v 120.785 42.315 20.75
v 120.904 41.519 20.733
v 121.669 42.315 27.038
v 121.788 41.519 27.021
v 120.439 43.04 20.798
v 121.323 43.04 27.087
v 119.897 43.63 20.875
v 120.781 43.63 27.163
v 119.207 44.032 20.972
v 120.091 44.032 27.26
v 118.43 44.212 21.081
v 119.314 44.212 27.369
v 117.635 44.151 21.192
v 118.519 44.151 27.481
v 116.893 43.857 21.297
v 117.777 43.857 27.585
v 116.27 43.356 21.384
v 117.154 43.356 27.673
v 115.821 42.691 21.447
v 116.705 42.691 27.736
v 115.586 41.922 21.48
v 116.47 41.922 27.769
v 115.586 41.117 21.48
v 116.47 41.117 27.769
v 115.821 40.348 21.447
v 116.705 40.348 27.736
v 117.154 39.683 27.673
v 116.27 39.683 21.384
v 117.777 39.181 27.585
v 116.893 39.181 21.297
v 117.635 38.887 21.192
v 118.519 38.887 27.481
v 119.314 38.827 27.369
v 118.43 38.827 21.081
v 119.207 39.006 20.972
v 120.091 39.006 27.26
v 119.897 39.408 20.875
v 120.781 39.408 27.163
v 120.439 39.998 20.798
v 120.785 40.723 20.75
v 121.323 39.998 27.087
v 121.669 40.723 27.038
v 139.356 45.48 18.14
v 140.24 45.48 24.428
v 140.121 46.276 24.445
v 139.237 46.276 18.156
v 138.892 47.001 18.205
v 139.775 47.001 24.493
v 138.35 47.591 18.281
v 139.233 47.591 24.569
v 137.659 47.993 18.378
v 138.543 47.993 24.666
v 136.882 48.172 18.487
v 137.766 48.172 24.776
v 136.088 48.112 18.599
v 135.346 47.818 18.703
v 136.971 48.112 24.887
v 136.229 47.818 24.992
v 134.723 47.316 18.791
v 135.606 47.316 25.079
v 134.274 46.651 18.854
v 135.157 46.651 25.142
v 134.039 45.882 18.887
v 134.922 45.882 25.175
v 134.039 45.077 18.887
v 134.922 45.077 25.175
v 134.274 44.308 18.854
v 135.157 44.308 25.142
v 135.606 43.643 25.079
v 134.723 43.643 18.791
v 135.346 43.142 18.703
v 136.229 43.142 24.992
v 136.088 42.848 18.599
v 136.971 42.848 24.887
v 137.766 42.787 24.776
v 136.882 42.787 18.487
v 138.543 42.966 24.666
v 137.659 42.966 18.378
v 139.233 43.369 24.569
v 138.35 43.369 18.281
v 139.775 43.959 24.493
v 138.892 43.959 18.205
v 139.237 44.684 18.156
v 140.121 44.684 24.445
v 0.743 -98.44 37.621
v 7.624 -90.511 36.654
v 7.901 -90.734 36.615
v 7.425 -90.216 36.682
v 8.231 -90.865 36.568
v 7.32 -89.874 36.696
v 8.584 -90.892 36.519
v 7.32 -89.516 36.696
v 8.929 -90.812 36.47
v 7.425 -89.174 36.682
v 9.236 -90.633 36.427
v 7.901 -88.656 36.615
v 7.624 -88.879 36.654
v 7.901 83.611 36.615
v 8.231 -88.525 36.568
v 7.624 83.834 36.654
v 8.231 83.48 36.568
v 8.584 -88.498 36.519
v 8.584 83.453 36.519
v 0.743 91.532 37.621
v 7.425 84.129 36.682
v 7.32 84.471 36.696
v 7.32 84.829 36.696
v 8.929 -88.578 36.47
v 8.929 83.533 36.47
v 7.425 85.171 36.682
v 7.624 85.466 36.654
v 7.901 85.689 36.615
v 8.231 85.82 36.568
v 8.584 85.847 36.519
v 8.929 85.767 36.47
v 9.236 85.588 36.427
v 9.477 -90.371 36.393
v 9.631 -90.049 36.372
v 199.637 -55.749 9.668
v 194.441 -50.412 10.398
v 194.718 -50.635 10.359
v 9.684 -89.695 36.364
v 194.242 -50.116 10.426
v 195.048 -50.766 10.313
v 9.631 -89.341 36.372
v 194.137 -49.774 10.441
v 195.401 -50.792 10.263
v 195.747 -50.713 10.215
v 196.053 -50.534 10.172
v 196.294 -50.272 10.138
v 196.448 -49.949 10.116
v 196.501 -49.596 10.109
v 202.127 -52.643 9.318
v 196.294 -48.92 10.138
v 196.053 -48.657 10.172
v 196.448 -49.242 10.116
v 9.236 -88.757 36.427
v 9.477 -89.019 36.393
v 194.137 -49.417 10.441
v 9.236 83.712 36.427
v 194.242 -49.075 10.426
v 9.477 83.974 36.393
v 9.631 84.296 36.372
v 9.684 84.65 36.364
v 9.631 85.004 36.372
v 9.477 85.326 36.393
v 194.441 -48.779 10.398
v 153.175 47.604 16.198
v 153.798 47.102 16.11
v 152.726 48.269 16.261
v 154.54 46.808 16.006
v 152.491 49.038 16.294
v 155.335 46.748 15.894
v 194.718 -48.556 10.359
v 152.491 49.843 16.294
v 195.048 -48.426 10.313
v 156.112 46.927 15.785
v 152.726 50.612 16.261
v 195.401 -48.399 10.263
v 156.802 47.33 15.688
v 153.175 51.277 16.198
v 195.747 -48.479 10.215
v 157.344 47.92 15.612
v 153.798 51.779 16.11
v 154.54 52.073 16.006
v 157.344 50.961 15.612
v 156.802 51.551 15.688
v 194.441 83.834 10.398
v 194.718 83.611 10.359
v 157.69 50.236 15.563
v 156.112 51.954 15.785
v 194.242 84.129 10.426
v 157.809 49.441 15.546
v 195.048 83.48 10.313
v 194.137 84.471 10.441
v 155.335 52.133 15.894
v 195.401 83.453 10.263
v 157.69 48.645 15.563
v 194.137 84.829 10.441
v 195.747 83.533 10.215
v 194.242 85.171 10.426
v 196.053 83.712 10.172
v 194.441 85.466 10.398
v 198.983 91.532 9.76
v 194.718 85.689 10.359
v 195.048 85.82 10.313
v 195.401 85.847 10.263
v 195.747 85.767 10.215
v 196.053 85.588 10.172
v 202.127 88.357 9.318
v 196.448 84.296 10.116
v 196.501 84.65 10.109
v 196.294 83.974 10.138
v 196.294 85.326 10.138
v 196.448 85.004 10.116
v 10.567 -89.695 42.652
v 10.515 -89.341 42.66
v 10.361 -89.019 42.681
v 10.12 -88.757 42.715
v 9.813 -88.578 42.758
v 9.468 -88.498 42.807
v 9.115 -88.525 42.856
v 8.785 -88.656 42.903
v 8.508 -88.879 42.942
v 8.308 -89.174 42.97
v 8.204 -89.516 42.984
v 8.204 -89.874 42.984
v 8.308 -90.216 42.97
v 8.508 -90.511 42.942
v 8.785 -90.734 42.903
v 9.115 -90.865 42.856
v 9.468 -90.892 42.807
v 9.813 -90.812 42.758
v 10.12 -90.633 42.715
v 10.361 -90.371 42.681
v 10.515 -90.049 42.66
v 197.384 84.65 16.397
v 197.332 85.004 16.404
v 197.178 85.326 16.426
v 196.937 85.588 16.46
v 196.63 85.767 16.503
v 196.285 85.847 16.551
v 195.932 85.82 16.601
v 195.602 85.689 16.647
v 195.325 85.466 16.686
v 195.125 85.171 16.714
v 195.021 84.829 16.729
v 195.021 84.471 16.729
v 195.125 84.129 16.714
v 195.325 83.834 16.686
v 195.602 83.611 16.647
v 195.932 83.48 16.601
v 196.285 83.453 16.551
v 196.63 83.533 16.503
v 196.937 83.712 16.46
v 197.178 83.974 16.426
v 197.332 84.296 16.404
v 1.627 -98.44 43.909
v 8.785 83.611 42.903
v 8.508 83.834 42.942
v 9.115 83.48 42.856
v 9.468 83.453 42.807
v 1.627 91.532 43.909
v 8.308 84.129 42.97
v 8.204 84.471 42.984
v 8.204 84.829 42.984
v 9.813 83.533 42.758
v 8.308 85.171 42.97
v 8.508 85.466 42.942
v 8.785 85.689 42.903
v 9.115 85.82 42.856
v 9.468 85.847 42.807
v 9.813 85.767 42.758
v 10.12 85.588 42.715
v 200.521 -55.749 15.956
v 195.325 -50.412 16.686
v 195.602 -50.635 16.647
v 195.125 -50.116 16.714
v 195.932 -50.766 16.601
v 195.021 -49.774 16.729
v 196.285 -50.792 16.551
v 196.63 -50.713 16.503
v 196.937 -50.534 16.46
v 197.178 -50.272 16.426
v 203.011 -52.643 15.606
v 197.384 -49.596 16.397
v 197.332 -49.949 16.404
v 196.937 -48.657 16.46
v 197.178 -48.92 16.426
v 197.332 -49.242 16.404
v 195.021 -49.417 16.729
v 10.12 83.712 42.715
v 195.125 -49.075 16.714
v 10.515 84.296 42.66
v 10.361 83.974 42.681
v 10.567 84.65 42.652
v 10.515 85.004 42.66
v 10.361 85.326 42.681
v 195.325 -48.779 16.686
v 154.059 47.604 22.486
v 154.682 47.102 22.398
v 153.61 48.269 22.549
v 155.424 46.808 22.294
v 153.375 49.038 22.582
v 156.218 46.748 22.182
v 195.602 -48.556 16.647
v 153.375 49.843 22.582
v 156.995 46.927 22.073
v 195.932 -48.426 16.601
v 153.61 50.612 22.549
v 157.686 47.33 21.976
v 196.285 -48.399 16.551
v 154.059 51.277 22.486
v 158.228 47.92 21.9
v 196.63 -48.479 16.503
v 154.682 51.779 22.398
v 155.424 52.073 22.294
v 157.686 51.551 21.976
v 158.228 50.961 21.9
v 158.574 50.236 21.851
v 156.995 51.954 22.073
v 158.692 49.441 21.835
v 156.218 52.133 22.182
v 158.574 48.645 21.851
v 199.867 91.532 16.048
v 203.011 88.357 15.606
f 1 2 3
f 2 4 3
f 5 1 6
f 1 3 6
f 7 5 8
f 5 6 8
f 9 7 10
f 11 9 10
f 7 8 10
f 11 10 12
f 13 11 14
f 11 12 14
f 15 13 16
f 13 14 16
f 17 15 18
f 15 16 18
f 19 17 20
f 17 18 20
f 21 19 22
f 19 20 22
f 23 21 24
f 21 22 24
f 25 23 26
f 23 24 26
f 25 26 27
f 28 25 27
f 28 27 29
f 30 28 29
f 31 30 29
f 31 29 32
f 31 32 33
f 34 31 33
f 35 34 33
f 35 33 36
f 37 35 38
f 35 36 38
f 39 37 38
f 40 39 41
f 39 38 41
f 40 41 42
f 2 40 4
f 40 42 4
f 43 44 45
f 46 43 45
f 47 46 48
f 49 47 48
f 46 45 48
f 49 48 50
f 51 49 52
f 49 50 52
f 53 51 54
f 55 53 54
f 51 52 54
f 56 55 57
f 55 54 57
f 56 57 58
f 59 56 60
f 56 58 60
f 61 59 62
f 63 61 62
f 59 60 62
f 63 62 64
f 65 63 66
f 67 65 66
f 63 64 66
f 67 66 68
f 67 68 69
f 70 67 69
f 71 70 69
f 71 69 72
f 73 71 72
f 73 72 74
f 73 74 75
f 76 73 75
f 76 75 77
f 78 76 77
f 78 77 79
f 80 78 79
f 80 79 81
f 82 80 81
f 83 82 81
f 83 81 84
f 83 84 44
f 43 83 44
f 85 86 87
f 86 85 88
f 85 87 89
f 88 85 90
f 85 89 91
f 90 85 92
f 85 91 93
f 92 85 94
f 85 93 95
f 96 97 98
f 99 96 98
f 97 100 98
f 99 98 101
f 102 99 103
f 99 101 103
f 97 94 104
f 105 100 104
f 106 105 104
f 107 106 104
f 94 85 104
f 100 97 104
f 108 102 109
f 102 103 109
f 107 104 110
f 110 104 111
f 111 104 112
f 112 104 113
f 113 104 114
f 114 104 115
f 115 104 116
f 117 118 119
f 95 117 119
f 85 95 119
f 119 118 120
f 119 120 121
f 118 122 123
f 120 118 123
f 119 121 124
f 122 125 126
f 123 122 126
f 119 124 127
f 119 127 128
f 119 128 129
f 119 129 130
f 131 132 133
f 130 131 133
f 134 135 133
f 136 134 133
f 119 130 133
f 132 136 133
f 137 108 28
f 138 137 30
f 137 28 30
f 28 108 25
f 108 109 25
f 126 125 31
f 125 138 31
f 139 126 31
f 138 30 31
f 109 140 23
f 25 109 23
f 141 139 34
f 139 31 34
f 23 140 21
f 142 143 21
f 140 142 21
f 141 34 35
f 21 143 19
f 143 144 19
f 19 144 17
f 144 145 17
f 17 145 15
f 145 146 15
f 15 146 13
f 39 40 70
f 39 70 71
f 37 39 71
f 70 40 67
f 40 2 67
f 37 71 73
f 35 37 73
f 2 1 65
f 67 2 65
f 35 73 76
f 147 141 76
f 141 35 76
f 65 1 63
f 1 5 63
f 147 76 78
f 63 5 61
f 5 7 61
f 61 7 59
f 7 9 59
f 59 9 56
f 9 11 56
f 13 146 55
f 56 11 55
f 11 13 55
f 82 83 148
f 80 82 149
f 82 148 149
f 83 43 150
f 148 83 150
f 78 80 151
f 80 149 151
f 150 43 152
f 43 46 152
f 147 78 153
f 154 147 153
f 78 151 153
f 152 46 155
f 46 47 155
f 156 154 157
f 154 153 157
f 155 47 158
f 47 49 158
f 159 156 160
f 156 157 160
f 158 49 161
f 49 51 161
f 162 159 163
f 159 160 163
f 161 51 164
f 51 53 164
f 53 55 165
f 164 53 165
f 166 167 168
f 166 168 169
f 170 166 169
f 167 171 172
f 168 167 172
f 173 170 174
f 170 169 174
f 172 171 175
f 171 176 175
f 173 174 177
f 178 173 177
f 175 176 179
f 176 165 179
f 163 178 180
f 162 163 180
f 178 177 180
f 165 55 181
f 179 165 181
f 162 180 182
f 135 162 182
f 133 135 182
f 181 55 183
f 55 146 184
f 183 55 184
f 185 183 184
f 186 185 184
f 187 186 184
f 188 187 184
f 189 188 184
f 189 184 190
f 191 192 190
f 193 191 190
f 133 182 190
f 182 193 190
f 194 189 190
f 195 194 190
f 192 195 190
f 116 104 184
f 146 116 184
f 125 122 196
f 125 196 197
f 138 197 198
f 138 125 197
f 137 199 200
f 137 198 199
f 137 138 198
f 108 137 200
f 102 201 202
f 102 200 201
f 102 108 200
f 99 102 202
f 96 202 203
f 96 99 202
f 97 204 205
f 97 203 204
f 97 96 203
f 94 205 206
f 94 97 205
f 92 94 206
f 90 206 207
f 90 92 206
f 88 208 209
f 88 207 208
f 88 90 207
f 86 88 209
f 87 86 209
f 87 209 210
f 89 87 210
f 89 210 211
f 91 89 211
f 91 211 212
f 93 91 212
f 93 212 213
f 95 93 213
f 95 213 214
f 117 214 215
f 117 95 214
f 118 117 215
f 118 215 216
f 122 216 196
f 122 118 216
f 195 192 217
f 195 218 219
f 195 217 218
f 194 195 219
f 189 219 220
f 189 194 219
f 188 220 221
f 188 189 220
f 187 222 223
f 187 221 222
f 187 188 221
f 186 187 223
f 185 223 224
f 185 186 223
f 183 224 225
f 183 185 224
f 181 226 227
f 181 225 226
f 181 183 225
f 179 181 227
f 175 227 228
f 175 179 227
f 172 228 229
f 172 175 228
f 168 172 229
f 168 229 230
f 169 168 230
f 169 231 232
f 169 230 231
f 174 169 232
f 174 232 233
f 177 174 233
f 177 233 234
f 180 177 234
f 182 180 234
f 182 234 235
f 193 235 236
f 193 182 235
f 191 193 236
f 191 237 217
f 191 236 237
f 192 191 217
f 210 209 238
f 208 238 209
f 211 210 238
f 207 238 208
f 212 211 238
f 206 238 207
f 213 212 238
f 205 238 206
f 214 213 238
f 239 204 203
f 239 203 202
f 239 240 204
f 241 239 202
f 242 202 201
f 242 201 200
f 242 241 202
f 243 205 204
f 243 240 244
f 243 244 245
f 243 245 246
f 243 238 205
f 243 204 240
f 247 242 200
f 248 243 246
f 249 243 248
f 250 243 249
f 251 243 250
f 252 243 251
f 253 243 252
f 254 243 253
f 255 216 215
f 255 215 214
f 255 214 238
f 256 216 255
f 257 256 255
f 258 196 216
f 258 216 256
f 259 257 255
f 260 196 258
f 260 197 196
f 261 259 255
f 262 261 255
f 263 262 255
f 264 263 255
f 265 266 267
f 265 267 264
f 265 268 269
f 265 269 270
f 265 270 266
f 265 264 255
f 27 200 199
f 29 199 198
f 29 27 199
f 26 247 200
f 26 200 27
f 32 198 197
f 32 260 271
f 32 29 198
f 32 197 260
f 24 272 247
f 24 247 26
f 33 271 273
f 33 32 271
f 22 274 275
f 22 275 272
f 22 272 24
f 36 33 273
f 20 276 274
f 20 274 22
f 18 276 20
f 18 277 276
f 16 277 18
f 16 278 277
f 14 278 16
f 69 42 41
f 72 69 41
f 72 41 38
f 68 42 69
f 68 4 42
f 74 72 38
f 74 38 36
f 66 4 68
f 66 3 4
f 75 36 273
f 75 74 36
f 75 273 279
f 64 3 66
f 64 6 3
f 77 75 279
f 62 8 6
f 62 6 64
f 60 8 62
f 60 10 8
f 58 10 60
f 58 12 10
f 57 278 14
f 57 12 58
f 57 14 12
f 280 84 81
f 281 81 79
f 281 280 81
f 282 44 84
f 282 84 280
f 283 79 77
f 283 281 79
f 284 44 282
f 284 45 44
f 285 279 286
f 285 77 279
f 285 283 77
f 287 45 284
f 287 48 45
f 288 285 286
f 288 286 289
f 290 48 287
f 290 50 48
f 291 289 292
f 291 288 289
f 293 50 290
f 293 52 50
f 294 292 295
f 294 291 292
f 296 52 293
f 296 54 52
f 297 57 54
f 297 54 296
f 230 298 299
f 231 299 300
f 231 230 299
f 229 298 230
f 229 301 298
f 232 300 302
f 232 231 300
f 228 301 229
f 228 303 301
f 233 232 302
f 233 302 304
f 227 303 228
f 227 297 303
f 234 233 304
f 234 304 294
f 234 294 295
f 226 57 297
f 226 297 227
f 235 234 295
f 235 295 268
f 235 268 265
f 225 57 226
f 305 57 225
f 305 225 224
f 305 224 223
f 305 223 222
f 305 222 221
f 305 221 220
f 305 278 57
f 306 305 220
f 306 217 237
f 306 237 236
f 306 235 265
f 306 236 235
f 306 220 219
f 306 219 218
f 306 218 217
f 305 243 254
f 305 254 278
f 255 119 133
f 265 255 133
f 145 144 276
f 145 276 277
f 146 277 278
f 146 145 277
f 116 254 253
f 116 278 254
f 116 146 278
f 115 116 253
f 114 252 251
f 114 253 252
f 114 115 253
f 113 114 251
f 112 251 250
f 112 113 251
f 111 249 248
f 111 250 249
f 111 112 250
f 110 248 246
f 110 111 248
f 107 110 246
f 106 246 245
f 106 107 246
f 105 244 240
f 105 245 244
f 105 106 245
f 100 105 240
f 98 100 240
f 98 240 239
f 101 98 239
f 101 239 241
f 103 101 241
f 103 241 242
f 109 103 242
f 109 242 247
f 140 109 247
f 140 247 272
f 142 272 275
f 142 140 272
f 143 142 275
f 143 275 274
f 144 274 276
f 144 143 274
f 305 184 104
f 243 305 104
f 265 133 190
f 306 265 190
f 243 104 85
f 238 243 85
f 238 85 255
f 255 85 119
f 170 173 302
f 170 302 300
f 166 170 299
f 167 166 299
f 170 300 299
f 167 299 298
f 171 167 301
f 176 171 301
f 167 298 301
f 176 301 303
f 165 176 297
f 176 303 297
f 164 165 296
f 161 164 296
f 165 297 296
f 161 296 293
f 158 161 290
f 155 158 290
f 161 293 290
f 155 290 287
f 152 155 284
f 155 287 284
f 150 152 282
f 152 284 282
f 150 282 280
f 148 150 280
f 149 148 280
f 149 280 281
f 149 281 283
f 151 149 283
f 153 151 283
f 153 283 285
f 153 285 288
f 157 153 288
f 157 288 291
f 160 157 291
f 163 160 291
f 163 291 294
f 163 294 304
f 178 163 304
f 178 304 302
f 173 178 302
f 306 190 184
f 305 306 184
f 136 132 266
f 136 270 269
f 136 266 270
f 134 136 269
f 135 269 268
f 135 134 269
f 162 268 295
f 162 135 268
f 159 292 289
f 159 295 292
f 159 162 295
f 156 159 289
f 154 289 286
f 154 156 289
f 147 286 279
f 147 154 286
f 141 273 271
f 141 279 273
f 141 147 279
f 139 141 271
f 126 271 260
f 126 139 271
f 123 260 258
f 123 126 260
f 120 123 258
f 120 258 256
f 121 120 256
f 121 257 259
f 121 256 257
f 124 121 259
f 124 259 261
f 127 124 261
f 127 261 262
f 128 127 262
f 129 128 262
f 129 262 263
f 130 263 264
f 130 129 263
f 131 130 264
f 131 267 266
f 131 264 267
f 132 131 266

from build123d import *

# Parameters (mm, degrees)
SKETCH022_AS_DRAWN_R                      = 2.7
EXTRUDE013_DEPTH                          = 25.4
EXTRUDE013_ONTO_SKETCH022_PLACEMENT_ANGLE = 8
SKETCH018_AS_DRAWN_R                      = 1.2
EXTRUDE009_DEPTH                          = 7.8
EXTRUDE009_ONTO_SKETCH018_PLACEMENT_ANGLE = 8
EXTRUDE012_DEPTH                          = 6.35
EXTRUDE012_ONTO_SKETCH021_PLACEMENT_ANGLE = 8


with BuildPart() as top_led_holes:
    # Sketch022 as drawn → Extrude013 (new, symmetric)
    with BuildSketch(Plane.XY):
        with Locations((116.082414, 49.440535)):
            Circle(SKETCH022_AS_DRAWN_R)
        with Locations((97.448702, 45.479818)):
            Circle(SKETCH022_AS_DRAWN_R)
        with Locations((78.81499, 41.5191)):
            Circle(SKETCH022_AS_DRAWN_R)
    extrude(amount=EXTRUDE013_DEPTH, both=True)


with BuildPart() as top_led_holes_1:
    # Extrude013 onto Sketch022 placement: moved
    add(top_led_holes.part.moved(Location((42.3672, 0, 47.625))).rotate(Axis((42.3672, 0, 47.625), (0, 1, 0)), EXTRUDE013_ONTO_SKETCH022_PLACEMENT_ANGLE))


with BuildPart() as screw_hole_cuts:
    # Sketch018 as drawn → Extrude009 (new)
    with BuildSketch(Plane.XY):
        with Locations((-31.998318, 84.649891)):
            Circle(SKETCH018_AS_DRAWN_R)
        with Locations((-31.998318, -89.695043)):
            Circle(SKETCH018_AS_DRAWN_R)
        with Locations((156.654735, -49.595599)):
            Circle(SKETCH018_AS_DRAWN_R)
        with Locations((156.654735, 84.649891)):
            Circle(SKETCH018_AS_DRAWN_R)
    extrude(amount=EXTRUDE009_DEPTH)


with BuildPart() as screw_hole_cuts_1:
    # Extrude009 onto Sketch018 placement: moved
    add(screw_hole_cuts.part.moved(Location((39.98734, 0, 30.691416))).rotate(Axis((39.98734, 0, 30.691416), (0, 1, 0)), EXTRUDE009_ONTO_SKETCH018_PLACEMENT_ANGLE))


with BuildPart() as cut006:
    # Sketch021 as drawn → Extrude012 (new)
    with BuildSketch(Plane.XY):
        Polygon((-39.826537, 91.531891), (-39.826537, -98.44048), (161.021837, -55.74884), (163.536735, -52.643218), (163.536735, 88.356895), (160.361736, 91.531891), align=None)
    extrude(amount=EXTRUDE012_DEPTH)


with BuildPart() as cut006_1:
    # Extrude012 onto Sketch021 placement: moved
    add(cut006.part.moved(Location((40.182182, 0, 32.077791))).rotate(Axis((40.182182, 0, 32.077791), (0, 1, 0)), EXTRUDE012_ONTO_SKETCH021_PLACEMENT_ANGLE))

    # Cut004: cut Screw Hole Cuts
    add(screw_hole_cuts_1.part, mode=Mode.SUBTRACT)

    # Cut006: cut Top LED Holes
    add(top_led_holes_1.part, mode=Mode.SUBTRACT)


solid = cut006_1.part
